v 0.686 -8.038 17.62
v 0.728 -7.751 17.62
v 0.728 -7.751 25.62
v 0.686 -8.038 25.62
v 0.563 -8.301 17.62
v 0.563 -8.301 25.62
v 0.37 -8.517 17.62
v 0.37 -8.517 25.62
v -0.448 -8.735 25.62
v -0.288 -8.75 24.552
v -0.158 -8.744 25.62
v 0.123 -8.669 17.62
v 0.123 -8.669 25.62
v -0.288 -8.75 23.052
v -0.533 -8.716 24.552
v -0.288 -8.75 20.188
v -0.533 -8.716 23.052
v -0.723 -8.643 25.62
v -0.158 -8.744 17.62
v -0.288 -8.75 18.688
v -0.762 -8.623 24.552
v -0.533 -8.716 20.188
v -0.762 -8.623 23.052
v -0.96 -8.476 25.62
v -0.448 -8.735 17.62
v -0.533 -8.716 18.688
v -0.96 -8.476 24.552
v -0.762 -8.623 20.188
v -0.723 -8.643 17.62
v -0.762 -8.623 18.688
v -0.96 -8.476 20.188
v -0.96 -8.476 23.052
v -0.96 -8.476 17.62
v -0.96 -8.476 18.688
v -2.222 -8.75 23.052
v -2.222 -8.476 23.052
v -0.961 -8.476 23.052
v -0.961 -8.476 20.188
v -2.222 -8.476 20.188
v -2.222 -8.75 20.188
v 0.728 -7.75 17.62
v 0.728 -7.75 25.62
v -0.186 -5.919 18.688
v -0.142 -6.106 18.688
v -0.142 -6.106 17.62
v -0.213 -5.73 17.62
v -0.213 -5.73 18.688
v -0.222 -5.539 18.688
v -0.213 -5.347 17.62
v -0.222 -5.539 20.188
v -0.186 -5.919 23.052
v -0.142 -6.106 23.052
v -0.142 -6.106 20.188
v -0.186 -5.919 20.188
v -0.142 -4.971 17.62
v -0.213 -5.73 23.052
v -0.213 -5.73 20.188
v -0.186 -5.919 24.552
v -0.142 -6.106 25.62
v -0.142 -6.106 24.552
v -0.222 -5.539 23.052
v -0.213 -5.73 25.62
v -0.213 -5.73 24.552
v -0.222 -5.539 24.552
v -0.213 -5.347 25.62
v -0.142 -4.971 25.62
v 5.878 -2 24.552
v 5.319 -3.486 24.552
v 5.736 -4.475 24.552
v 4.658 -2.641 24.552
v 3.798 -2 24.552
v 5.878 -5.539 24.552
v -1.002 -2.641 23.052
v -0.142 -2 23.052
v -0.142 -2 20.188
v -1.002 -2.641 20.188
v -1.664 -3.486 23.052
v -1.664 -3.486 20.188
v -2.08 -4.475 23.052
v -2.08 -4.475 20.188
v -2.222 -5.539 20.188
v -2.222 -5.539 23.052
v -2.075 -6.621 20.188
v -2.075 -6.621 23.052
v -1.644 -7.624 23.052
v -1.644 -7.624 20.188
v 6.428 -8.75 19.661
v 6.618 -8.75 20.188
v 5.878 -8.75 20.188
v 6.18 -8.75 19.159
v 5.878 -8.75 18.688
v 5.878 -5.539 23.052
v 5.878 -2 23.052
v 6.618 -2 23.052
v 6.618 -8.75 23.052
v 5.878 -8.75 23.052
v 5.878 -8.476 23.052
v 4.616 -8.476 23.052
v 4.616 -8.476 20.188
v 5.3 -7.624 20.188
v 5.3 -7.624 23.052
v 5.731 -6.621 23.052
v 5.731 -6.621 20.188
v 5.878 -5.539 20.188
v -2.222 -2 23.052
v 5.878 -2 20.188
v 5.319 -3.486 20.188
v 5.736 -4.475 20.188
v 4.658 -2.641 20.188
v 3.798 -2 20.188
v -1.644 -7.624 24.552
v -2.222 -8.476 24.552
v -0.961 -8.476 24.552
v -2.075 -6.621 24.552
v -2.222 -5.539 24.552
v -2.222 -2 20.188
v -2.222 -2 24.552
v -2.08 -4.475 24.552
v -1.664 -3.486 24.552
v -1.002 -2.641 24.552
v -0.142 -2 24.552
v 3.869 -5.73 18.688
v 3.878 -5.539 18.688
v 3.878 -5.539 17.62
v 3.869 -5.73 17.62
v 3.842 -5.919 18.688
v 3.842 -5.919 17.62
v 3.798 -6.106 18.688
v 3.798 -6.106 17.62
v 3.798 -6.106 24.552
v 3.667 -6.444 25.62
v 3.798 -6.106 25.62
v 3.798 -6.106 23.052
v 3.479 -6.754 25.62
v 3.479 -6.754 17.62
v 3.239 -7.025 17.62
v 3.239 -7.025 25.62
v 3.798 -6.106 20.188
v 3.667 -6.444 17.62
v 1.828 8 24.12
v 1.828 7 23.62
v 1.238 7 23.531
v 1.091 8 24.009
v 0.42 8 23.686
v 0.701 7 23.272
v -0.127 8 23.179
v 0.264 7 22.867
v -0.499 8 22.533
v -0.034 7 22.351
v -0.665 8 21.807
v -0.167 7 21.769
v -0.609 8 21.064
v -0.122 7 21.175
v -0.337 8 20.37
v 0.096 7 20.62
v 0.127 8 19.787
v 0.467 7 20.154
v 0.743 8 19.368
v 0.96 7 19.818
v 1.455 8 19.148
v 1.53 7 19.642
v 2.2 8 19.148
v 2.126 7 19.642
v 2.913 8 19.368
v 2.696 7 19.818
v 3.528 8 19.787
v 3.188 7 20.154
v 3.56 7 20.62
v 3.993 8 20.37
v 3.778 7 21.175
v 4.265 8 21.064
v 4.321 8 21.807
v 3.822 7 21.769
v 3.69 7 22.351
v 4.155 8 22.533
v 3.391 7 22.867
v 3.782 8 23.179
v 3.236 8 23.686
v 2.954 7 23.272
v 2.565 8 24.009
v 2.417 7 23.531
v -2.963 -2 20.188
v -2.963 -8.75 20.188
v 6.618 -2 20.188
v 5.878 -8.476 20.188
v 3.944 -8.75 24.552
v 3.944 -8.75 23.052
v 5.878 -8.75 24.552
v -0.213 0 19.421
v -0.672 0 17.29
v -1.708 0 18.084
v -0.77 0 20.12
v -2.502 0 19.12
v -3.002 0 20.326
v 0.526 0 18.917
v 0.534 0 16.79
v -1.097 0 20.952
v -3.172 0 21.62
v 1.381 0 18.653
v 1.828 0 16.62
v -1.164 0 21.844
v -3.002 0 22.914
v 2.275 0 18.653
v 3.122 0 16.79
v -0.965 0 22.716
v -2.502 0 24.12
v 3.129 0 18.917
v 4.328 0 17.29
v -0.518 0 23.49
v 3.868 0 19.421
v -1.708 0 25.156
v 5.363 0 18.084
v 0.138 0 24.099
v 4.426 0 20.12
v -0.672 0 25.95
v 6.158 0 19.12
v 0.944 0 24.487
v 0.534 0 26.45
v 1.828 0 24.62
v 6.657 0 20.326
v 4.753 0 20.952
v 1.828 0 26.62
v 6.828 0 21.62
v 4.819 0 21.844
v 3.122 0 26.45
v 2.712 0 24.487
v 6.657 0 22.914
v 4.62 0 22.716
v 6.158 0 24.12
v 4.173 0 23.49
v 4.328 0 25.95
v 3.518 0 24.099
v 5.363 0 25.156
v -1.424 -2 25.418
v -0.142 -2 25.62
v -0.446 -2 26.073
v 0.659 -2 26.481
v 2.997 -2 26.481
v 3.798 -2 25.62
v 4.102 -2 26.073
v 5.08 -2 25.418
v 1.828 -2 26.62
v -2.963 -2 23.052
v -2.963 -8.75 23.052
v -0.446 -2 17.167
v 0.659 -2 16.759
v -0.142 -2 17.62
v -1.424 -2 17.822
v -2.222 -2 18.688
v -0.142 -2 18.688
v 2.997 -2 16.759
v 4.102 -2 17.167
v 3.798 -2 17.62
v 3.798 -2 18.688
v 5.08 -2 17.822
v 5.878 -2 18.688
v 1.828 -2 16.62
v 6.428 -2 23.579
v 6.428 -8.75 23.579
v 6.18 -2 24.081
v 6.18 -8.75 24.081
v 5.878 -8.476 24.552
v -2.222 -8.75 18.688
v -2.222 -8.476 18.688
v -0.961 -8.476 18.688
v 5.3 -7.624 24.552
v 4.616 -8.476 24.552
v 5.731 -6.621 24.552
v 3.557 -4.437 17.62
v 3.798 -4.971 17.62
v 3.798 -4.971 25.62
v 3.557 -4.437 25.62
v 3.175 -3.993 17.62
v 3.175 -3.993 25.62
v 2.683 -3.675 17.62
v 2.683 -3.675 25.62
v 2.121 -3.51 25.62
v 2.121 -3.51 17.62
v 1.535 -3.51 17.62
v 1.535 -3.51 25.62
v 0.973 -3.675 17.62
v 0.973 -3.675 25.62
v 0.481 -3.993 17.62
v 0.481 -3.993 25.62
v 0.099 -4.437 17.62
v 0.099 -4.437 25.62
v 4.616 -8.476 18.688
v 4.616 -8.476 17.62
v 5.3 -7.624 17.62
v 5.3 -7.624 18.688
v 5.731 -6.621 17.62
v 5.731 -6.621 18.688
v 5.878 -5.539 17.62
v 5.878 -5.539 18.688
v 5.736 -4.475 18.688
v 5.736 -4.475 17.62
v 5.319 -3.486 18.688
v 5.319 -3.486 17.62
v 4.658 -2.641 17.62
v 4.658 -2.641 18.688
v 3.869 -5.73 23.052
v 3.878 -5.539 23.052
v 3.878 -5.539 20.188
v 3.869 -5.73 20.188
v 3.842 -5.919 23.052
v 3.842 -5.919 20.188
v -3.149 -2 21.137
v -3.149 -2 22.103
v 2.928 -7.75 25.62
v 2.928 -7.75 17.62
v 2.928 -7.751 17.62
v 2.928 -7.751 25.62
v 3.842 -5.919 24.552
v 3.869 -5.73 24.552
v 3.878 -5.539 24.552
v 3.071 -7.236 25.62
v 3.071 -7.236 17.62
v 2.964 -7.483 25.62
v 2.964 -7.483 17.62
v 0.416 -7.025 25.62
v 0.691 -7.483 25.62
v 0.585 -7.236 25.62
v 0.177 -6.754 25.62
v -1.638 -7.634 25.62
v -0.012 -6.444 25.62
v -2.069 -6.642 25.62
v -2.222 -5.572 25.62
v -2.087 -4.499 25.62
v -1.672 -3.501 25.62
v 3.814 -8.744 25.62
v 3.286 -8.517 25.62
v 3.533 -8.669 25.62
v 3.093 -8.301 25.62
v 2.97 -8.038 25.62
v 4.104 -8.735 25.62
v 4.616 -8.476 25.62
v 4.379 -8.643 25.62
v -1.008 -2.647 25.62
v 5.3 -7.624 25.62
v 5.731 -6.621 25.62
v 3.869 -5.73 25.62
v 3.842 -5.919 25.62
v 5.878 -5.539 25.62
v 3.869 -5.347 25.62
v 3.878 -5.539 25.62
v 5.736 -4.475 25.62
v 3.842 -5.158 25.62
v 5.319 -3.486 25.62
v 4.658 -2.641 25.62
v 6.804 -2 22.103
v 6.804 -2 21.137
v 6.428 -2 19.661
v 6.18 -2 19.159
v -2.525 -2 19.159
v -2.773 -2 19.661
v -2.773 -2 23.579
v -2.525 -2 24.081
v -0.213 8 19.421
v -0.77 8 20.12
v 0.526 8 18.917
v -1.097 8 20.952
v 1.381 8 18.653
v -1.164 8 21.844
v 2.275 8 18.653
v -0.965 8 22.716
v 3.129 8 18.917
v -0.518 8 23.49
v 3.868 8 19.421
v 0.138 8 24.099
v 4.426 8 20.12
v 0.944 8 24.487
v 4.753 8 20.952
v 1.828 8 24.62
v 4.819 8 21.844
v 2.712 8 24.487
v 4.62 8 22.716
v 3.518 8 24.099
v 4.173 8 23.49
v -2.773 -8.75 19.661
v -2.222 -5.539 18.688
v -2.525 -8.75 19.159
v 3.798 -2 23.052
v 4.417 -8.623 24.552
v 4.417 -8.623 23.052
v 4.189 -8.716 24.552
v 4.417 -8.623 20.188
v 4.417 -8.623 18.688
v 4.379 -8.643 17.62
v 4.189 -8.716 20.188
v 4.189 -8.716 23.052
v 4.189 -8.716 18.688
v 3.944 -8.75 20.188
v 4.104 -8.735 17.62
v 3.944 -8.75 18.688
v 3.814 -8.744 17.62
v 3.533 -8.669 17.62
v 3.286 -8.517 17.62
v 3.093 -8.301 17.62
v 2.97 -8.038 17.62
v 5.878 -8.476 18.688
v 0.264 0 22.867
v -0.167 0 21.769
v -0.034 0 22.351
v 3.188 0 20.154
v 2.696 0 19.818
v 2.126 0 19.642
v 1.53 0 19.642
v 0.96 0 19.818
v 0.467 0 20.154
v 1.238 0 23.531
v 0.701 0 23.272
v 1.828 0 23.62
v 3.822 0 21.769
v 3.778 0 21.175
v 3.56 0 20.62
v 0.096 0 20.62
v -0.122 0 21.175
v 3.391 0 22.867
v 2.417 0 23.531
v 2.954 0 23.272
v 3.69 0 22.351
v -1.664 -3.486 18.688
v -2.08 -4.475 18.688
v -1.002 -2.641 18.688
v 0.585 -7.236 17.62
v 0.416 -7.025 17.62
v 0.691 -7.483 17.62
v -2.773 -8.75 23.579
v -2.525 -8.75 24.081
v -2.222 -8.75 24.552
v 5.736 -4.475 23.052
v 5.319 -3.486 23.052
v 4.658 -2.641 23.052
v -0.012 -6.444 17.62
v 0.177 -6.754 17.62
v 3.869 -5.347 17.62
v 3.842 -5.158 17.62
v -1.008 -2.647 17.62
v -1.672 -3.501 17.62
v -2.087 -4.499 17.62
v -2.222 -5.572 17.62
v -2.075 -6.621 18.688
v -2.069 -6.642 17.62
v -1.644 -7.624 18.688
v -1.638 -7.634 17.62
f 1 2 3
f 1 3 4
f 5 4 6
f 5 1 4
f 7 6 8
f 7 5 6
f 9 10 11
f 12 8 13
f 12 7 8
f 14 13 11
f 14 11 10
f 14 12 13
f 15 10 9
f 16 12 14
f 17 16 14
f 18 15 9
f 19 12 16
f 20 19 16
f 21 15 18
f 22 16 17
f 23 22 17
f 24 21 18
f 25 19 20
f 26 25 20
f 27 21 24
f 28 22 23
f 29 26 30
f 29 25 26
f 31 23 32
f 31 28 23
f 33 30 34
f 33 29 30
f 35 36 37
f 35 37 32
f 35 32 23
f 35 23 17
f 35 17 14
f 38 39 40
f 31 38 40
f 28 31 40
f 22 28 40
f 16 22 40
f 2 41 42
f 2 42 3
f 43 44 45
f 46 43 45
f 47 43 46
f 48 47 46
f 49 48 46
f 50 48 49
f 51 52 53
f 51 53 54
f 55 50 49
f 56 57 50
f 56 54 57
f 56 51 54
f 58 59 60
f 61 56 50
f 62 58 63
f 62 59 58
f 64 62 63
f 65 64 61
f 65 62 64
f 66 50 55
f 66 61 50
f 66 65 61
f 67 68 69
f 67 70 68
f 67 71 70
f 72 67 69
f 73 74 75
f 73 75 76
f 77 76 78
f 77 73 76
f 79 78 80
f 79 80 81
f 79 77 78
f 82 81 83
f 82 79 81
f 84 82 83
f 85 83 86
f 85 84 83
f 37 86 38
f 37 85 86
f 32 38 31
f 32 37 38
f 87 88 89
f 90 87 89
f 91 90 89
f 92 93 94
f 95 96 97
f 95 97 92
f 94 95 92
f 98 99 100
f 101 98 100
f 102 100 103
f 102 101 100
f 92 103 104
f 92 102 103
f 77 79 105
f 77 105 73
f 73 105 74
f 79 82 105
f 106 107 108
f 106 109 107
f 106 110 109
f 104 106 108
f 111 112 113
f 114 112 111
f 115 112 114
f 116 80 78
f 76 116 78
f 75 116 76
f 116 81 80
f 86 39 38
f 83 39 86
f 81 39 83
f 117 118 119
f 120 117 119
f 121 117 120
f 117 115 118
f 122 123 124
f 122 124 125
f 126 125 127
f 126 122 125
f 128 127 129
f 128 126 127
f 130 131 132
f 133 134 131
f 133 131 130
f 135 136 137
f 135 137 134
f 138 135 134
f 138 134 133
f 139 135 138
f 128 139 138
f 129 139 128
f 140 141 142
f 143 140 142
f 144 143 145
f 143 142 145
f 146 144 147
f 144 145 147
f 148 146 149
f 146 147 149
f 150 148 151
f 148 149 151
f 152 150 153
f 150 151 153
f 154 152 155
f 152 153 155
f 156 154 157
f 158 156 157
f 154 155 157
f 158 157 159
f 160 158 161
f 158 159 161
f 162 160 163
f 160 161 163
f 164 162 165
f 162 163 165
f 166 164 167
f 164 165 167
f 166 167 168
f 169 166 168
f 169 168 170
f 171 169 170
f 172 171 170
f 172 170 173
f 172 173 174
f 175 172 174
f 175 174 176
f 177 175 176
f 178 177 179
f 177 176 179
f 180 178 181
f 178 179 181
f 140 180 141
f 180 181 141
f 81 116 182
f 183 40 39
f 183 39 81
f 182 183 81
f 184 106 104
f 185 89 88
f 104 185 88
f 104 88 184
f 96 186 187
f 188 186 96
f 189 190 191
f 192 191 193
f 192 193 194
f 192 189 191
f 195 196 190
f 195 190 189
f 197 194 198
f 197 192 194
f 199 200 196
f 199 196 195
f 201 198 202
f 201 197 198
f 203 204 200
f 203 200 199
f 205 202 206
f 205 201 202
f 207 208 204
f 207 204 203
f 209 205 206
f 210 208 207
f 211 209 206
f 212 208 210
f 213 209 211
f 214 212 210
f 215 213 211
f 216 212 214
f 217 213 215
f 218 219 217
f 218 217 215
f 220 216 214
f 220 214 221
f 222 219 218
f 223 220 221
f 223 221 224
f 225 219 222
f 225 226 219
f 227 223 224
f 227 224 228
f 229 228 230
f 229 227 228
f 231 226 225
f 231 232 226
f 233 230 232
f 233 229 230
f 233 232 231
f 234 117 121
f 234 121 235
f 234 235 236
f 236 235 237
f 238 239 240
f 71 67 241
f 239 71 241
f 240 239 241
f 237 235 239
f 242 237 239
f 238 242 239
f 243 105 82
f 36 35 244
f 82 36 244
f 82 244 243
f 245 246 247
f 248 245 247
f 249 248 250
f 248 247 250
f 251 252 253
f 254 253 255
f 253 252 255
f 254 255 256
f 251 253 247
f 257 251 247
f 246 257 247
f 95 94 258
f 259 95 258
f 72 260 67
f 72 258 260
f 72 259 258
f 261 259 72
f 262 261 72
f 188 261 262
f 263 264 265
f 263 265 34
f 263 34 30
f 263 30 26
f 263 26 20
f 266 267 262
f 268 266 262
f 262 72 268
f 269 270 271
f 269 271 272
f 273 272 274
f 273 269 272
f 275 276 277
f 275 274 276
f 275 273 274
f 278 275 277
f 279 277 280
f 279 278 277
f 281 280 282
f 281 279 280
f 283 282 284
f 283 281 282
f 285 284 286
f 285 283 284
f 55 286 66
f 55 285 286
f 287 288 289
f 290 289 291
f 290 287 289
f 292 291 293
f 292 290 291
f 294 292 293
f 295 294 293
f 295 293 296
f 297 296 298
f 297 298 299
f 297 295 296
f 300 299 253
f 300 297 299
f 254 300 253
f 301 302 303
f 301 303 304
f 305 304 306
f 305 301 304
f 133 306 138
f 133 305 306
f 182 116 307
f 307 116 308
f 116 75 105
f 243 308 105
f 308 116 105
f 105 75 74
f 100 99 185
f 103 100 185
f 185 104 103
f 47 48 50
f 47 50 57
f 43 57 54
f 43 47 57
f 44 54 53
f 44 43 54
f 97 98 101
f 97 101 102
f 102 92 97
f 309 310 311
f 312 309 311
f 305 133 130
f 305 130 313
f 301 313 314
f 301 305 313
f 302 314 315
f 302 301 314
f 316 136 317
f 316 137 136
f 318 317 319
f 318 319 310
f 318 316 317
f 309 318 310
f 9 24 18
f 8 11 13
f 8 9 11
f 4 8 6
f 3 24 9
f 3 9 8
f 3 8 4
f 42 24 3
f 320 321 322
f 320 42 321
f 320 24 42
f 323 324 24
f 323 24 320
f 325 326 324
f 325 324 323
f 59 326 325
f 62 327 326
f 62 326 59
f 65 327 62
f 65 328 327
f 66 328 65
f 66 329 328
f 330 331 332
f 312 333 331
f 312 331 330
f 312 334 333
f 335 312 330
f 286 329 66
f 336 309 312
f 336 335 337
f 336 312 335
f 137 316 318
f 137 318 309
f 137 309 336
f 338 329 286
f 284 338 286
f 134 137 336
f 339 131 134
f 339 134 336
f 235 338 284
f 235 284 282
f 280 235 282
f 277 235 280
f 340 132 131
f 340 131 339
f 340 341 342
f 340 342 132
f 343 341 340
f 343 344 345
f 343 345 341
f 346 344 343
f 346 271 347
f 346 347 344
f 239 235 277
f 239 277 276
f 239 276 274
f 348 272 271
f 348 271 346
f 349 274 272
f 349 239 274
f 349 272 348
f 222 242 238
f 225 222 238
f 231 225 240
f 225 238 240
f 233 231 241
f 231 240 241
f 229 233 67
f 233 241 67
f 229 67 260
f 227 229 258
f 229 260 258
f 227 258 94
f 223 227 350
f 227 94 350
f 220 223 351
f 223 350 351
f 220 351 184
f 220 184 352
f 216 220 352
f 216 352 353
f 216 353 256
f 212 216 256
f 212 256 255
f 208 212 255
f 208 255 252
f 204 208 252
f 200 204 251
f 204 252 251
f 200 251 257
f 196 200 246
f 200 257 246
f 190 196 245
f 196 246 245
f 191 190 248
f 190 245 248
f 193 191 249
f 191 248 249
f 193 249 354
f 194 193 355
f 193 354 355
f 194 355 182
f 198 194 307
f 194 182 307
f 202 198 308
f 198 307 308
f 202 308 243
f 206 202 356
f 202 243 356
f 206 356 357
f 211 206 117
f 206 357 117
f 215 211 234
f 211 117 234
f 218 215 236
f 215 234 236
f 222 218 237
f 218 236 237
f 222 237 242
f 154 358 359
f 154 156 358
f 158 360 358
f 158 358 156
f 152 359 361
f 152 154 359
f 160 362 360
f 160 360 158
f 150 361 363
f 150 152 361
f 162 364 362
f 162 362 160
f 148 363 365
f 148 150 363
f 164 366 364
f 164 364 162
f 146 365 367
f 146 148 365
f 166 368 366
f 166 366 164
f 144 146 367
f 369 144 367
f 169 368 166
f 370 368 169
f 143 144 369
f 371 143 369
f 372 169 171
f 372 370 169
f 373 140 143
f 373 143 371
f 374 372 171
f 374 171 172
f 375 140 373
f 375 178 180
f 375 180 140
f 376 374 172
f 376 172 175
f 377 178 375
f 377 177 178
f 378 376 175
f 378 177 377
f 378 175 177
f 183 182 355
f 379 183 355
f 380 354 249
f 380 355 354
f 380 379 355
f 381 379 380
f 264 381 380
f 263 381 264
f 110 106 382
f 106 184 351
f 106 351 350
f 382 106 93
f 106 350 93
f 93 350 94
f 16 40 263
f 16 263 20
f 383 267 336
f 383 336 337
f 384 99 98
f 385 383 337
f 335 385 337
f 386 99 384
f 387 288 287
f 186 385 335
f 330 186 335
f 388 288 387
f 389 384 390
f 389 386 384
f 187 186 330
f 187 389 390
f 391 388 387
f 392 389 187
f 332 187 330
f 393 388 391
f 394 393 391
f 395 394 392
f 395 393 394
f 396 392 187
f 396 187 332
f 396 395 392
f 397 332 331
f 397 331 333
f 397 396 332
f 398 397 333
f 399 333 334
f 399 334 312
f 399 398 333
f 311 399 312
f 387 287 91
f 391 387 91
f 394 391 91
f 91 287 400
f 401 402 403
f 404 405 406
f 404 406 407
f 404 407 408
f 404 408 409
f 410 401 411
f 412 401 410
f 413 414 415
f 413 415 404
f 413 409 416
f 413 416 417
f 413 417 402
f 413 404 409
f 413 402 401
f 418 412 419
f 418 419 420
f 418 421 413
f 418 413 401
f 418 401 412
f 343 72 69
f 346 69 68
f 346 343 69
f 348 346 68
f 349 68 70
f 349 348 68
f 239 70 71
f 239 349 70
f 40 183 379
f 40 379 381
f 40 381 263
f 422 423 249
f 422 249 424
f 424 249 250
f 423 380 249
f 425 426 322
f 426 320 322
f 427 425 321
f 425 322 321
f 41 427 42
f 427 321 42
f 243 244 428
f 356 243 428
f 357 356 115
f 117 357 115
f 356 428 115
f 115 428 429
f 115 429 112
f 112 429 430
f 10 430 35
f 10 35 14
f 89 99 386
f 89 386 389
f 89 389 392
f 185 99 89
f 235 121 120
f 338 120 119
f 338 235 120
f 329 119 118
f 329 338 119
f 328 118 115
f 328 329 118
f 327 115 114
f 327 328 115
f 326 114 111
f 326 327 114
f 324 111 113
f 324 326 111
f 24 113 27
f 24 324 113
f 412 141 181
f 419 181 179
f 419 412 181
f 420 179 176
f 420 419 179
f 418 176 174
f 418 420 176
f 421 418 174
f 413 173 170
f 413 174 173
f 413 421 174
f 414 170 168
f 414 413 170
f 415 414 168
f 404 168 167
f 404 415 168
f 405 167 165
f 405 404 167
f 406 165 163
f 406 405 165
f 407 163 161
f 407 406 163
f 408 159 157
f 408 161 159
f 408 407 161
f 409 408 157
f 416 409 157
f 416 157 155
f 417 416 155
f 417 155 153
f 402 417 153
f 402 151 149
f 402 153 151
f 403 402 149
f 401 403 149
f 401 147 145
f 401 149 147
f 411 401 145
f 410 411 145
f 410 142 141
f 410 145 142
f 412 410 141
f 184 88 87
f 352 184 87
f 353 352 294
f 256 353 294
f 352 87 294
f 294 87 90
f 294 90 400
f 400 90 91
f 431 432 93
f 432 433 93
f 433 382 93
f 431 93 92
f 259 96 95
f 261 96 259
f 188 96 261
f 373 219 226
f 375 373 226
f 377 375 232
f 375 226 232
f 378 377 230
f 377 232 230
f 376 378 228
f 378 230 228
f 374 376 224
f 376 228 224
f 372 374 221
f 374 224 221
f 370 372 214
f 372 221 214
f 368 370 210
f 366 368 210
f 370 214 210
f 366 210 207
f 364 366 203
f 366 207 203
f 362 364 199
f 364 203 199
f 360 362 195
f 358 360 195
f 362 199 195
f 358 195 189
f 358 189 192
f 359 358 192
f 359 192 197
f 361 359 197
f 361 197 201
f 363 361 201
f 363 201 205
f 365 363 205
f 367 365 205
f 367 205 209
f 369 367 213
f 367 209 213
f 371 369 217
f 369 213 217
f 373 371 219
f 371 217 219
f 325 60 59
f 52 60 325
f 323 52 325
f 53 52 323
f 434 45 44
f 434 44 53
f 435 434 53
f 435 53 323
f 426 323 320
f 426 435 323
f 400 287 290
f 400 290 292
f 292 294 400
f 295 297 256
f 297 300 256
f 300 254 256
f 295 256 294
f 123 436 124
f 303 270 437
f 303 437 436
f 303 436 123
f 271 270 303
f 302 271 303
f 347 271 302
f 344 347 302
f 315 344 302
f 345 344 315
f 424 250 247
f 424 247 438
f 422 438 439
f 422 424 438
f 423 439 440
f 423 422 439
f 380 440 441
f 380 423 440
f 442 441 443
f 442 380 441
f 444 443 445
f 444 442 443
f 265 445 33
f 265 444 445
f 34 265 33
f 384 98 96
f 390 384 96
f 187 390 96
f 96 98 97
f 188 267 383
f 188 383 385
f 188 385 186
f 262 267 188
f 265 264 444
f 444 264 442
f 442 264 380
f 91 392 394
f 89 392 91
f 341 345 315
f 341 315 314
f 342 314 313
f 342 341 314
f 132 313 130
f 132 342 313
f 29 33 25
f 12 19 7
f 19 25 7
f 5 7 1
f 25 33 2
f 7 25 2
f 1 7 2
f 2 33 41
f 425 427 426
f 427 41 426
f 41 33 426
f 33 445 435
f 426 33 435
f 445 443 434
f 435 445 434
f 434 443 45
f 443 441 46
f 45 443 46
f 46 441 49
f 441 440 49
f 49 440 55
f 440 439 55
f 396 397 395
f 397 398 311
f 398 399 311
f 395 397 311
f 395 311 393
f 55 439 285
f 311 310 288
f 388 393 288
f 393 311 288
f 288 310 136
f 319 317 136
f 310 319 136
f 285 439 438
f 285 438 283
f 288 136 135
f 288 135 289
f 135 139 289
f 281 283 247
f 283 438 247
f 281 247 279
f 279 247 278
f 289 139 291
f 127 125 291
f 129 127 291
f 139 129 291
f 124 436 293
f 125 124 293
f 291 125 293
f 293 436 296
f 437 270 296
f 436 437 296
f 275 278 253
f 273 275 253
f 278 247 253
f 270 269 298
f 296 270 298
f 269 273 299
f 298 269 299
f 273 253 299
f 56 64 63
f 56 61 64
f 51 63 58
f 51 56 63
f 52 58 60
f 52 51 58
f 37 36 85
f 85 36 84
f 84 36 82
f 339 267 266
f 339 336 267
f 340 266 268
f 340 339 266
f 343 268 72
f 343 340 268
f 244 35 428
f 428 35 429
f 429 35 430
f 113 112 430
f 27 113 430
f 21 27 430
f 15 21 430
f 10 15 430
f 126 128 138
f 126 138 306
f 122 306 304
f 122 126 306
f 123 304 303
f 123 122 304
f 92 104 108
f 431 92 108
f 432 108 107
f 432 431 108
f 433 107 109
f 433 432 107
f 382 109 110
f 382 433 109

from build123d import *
from build123d.topology import SkipClean

# Parameters (mm, degrees)
BOSS_EXTRUDE9_DEPTH       = 5.6
BOSS_EXTRUDE9_DEPTH_BACK  = 2
SKETCH16_W                = 8
SKETCH16_H                = 3.5
BOSS_EXTRUDE11_DEPTH      = 8
CHAMFER2_SIZE             = 1.5
SKETCH17_W                = 3.94
SKETCH17_H                = 8
BOSS_EXTRUDE12_DEPTH      = 6.3
CUT_EXTRUDE2_START        = -5.6
CUT_EXTRUDE2_DEPTH        = 3.6
SKETCH21_R                = 1.5
BOSS_EXTRUDE14_DEPTH      = 3.6
CHAMFER4_SIZE             = 1
CUT_EXTRUDE3_DEPTH        = 3.6
SPLIT1_START              = -2
SPLIT1_DEPTH              = 7.6
SKETCH22_R                = 5
BOSS_EXTRUDE15_DEPTH      = 2
SKETCH23_R                = 3
BOSS_EXTRUDE16_DEPTH      = 8
CUT_EXTRUDE4_DEPTH        = 32.952026383
CUT_EXTRUDE4_DEPTH_BACK   = 8
SKETCH24_R                = 2
CHAMFER5_SIZE             = 0.5
CHAMFER5_SIZE2            = 1
BOSS_EXTRUDE17_DEPTH      = 8
CUT_EXTRUDE6_DEPTH        = 15.719504629
CUT_EXTRUDE6_DEPTH_BACK   = 15.719504629
FILLET2_R                 = 1
BOSS_EXTRUDE18_REACH      = 31.245
BOSS_EXTRUDE18_END_RADIUS = 4.05
SKETCH27_W                = 2.08
SKETCH27_H                = 1.5
BOSS_EXTRUDE19_START      = 3.538587
SKETCH27_3_W              = 2.08
SKETCH27_3_H              = 1.5
BOSS_EXTRUDE19_DEPTH      = 2.937113
CUT_EXTRUDE7_DEPTH        = 15.289597343
CUT_EXTRUDE7_DEPTH_BACK   = 15.289597343
SKETCH29_W                = 1.95
SKETCH29_H                = 0.274787005
BOSS_EXTRUDE20_DEPTH      = 1.5
BOSS_EXTRUDE21_START      = -4.364299
SKETCH29_3_W              = 1.95
SKETCH29_3_H              = 0.274787005
BOSS_EXTRUDE21_DEPTH      = 1.5
BOSS_EXTRUDE22_DEPTH      = 6.750486925


# Read off the part's stored shape, not the designer's step: Split1
# Some blends are built 0.0001 mm under size
with BuildPart() as part:
    # Sketch14 → Boss-Extrude9 (new, two sides: drawn at the far end of the back side and taken through both)
    with BuildSketch(Plane(origin=(0, 0, 0), x_dir=(1, 0, 0), z_dir=(0, 1, 0)).offset(-BOSS_EXTRUDE9_DEPTH_BACK)):
        with BuildLine():
            Line((-4.172171186, -20.619968889), (-4.172171186, -25.619968889))
            Line((-4.172171186, -25.619968889), (7.827828814, -25.619968889))
            Line((7.827828814, -25.619968889), (7.827828814, -20.619968889))
            ThreePointArc((7.827828814, -20.619968889), (1.827828814, -14.619968889), (-4.172171186, -20.619968889))
        make_face()
    extrude(amount=BOSS_EXTRUDE9_DEPTH + BOSS_EXTRUDE9_DEPTH_BACK)

    # Sketch16 → Boss-Extrude11 (add)
    with BuildSketch(Plane.XY.offset(25.619968889)):
        with Locations((1.827828814, 1.75)):
            Rectangle(SKETCH16_W, SKETCH16_H)
    extrude(amount=BOSS_EXTRUDE11_DEPTH)

    # Chamfer2
    chamfer2_edges = [part.edges().sort_by_distance(p)[0] for p in [
        (1.827828814, -2, 14.619968889),
        (7.827828814, 5.6, 23.119968889),
        (1.827828814, 5.6, 14.619968889),
        (-4.172171186, -2, 23.119968889),
        (-4.172171186, 5.6, 23.119968889),
        (7.827828814, -2, 23.119968889),
    ]]
    chamfer(chamfer2_edges, length=CHAMFER2_SIZE)

    # Sketch17 → Boss-Extrude12 (add)
    with BuildSketch(Plane.XZ.offset(2)):
        with Locations((1.827828814, 21.619968889)):
            Rectangle(SKETCH17_W, SKETCH17_H)
    extrude(amount=BOSS_EXTRUDE12_DEPTH)

    # Sketch20 → Cut-Extrude2 (cut)
    with BuildSketch(Plane(origin=(0, 5.6, 0), x_dir=(1, 0, 0), z_dir=(0, 1, 0)).offset(CUT_EXTRUDE2_START)):
        with BuildLine():
            Line((7.827828814, -20.619968889), (-4.172171186, -20.619968889))
            ThreePointArc((-4.172171186, -20.619968889), (1.827828814, -14.619968889), (7.827828814, -20.619968889))
        make_face()
    extrude(amount=CUT_EXTRUDE2_DEPTH, mode=Mode.SUBTRACT)

    # Sketch21 → Boss-Extrude14 (add)
    with BuildSketch(Plane(origin=(0, 0, 0), x_dir=(1, 0, 0), z_dir=(0, 1, 0))):
        with BuildLine():
            ThreePointArc((7.827828814, -20.619968889), (7.63955943, -19.128732072), (7.086566399, -17.731080001))
            ThreePointArc((7.086566399, -17.731080001), (6.279209969, -19.350325806), (4.990106474, -20.619968889))
            Line((4.990106474, -20.619968889), (7.827828814, -20.619968889))
        make_face()
        with BuildLine():
            ThreePointArc((-1.334448847, -20.619968889), (-2.623552342, -19.350325806), (-3.430908771, -17.731080001))
            ThreePointArc((-3.430908771, -17.731080001), (-3.983901803, -19.128732072), (-4.172171186, -20.619968889))
            Line((-4.172171186, -20.619968889), (-1.334448847, -20.619968889))
        make_face()
        with Locations(Location((1.827828814, -16.119968889, 0), (0, 0, 90.000763944))):
            Circle(SKETCH21_R)
    extrude(amount=BOSS_EXTRUDE14_DEPTH)

    # Chamfer4
    # the kernel refuses this chamfer: 1 mm, written as the material it adds along each edge
    with BuildSketch(Plane(origin=(1.827828814, 3.6, 16.119968889), x_dir=(-1.3333338100422289e-05, 0, -0.999999999911111), z_dir=(0.999999999911111, 0, -1.3333338100422289e-05))) as chamfer4_piece_1_section:
        Polygon((1.5, -CHAMFER4_SIZE), (1.5 + CHAMFER4_SIZE, 0), (1.5, 0), align=None)
    chamfer4_piece_1 = revolve(axis=Axis((1.827828814, 3.6, 16.119968889), (0, 1, 0)), mode=Mode.PRIVATE)
    chamfer4_piece_1 = chamfer4_piece_1 & Plane(origin=(1.827828814, 3.111670507, 20.619968889), x_dir=(1, 0, 0), z_dir=(0, -1, 0)) * Cylinder(6, 10, mode=Mode.PRIVATE)
    add(chamfer4_piece_1)
    with BuildSketch(Plane(origin=(1.827828814, 0, 16.119968889), x_dir=(-1.3333338100422289e-05, 0, -0.999999999911111), z_dir=(0.999999999911111, 0, -1.3333338100422289e-05))) as chamfer4_piece_2_section:
        Polygon((1.5 + CHAMFER4_SIZE, 0), (1.5, CHAMFER4_SIZE), (1.5, 0), align=None)
    chamfer4_piece_2 = revolve(axis=Axis((1.827828814, 0, 16.119968889), (0, 1, 0)), mode=Mode.PRIVATE)
    chamfer4_piece_2 = chamfer4_piece_2 & Plane(origin=(1.827828814, 0.488329493, 20.619968889), x_dir=(1, 0, 0), z_dir=(0, -1, 0)) * Cylinder(6, 10, mode=Mode.PRIVATE)
    add(chamfer4_piece_2)

    # Sketch21<3> → Cut-Extrude3 (cut)
    with BuildSketch(Plane(origin=(0, 0, 0), x_dir=(1, 0, 0), z_dir=(0, 1, 0))):
        with BuildLine():
            Line((4.990106474, -20.619968889), (-1.334448847, -20.619968889))
            ThreePointArc((-1.334448847, -20.619968889), (1.827828814, -21.619968889), (4.990106474, -20.619968889))
        make_face()
    extrude(amount=CUT_EXTRUDE3_DEPTH, mode=Mode.SUBTRACT)

    # Split1 outline → Split1 (cut)
    with BuildSketch(Plane(origin=(0, 0, 0), x_dir=(1, 0, 0), z_dir=(0, 1, 0)).offset(SPLIT1_START)):
        with BuildLine():
            Line((7.827828814, -25.619968889), (7.827828814, -20.619968889))
            ThreePointArc((7.827828814, -20.619968889), (1.827828814, -14.619968889), (-4.172171186, -20.619968889))
            Line((-4.172171186, -20.619968889), (-4.172171186, -25.619968889))
            Line((-4.172171186, -25.619968889), (-2.172171186, -25.619968889))
            Line((-2.172171186, -25.619968889), (-2.172171186, -33.619968889))
            Line((-2.172171186, -33.619968889), (5.827828814, -33.619968889))
            Line((5.827828814, -33.619968889), (5.827828814, -25.619968889))
            Line((5.827828814, -25.619968889), (7.827828814, -25.619968889))
        make_face()
    extrude(amount=SPLIT1_DEPTH, mode=Mode.SUBTRACT)

    # Sketch22 → Boss-Extrude15 (add)
    with BuildSketch(Plane(origin=(0, -2, 0), x_dir=(1, 0, 0), z_dir=(0, 1, 0))):
        with Locations(Location((1.827828814, -21.619968889, 0), (0, 0, 270))):
            Circle(SKETCH22_R)
    extrude(amount=BOSS_EXTRUDE15_DEPTH)

    # Sketch23 → Boss-Extrude16 (add)
    with BuildSketch(Plane(origin=(0, 0, 0), x_dir=(1, 0, 0), z_dir=(0, 1, 0))):
        with Locations(Location((1.827828814, -21.619968889, 0), (0, 0, 270))):
            Circle(SKETCH23_R)
    extrude(amount=BOSS_EXTRUDE16_DEPTH)

    # Sketch24 → Cut-Extrude4 (cut, two sides: drawn at the far end of the back side and taken through both)
    with BuildSketch(Plane(origin=(0, 8, 0), x_dir=(1, 0, 0), z_dir=(0, 1, 0)).offset(-CUT_EXTRUDE4_DEPTH_BACK)):
        with Locations(Location((1.827828814, -21.619968889, 0), (0, 0, 270))):
            Circle(SKETCH24_R)
    extrude(amount=CUT_EXTRUDE4_DEPTH + CUT_EXTRUDE4_DEPTH_BACK, mode=Mode.SUBTRACT)

    # Chamfer5
    chamfer5_edges = [part.edges().sort_by_distance(p)[0] for p in [
        (1.827828814, 8, 19.619968889),
    ]]
    chamfer5_side = [part.faces().sort_by_distance(p)[0] for p in [
        (1.827828814, 8, 18.704821703),
    ]]
    chamfer(chamfer5_edges, length=CHAMFER5_SIZE, length2=CHAMFER5_SIZE2, reference=chamfer5_side[0])

    # Sketch25 → Boss-Extrude17 (add)
    with BuildSketch(Plane.XY.offset(25.619968889)):
        with BuildLine():
            Line((3.797828814, -8.3), (2.927828814, -8.3))
            Line((2.927828814, -8.3), (2.927828814, -9.436343053))
            ThreePointArc((2.927828814, -9.436343053), (5.057186335, -7.982712899), (5.877828814, -5.538587289))
            ThreePointArc((5.877828814, -5.538587289), (5.319318467, -3.486271524), (3.797828814, -2))
            Line((3.797828814, -2), (3.797828814, -4.971489414))
            ThreePointArc((3.797828814, -4.971489414), (3.857730289, -5.252230867), (3.877828814, -5.538587289))
            ThreePointArc((3.877828814, -5.538587289), (3.857730289, -5.82494371), (3.797828814, -6.105685164))
            Line((3.797828814, -6.105685164), (3.797828814, -8.3))
        make_face()
        with BuildLine():
            Line((0.727828814, -9.436343053), (0.727828814, -8.3))
            Line((0.727828814, -8.3), (-0.142171186, -8.3))
            Line((-0.142171186, -8.3), (-0.142171186, -6.105685164))
            ThreePointArc((-0.142171186, -6.105685164), (-0.222171186, -5.538587289), (-0.142171186, -4.971489414))
            Line((-0.142171186, -4.971489414), (-0.142171186, -2))
            ThreePointArc((-0.142171186, -2), (-2.194735605, -6.009199123), (0.727828814, -9.436343053))
        make_face()
        with BuildLine():
            Line((-0.142171186, -2), (-0.142171186, -4.971489414))
            ThreePointArc((-0.142171186, -4.971489414), (1.827828814, -3.488587289), (3.797828814, -4.971489414))
            Line((3.797828814, -4.971489414), (3.797828814, -2))
            Line((3.797828814, -2), (-0.142171186, -2))
        make_face()
        with BuildLine():
            ThreePointArc((3.797828814, -6.105685164), (3.469243788, -6.766698391), (2.927828814, -7.268471678))
            Line((2.927828814, -7.268471678), (2.927828814, -8.3))
            Line((2.927828814, -8.3), (3.797828814, -8.3))
            Line((3.797828814, -8.3), (3.797828814, -6.105685164))
        make_face()
        with BuildLine():
            Line((0.727828814, -8.3), (0.727828814, -7.268471678))
            ThreePointArc((0.727828814, -7.268471678), (0.186413839, -6.766698391), (-0.142171186, -6.105685164))
            Line((-0.142171186, -6.105685164), (-0.142171186, -8.3))
            Line((-0.142171186, -8.3), (0.727828814, -8.3))
        make_face()
    extrude(amount=-BOSS_EXTRUDE17_DEPTH)

    # Sketch25<3> → Cut-Extrude6 (cut, two sides: drawn at the far end of the back side and taken through both)
    with BuildSketch(Plane.XY.offset(25.619968889).offset(-CUT_EXTRUDE6_DEPTH_BACK)):
        with BuildLine():
            ThreePointArc((-0.142171186, -6.105685164), (0.186413839, -6.766698391), (0.727828814, -7.268471678))
            Line((0.727828814, -7.268471678), (0.727828814, -8.3))
            Line((0.727828814, -8.3), (2.927828814, -8.3))
            Line((2.927828814, -8.3), (2.927828814, -7.268471678))
            ThreePointArc((2.927828814, -7.268471678), (3.469243788, -6.766698391), (3.797828814, -6.105685164))
            Line((3.797828814, -6.105685164), (3.797828814, -4.971489414))
            ThreePointArc((3.797828814, -4.971489414), (1.827828814, -3.488587289), (-0.142171186, -4.971489414))
            Line((-0.142171186, -4.971489414), (-0.142171186, -6.105685164))
        make_face()
    extrude(amount=CUT_EXTRUDE6_DEPTH + CUT_EXTRUDE6_DEPTH_BACK, mode=Mode.SUBTRACT)

    # Fillet2
    fillet2_edges = [part.edges().sort_by_distance(p)[0] for p in [
        (0.727828814, -7.268471678, 21.619968889),
        (2.927828814, -7.268471678, 21.619968889),
        (2.927828814, -9.436343053, 21.619968889),
        (0.727828814, -9.436343053, 21.619968889),
    ]]
    fillet(fillet2_edges, radius=FILLET2_R - 0.0001)  # a hair under: the kernel refuses the full size

    # Boss-Extrude18: up to this cylinder (the profile starts outside it)
    boss_extrude18_end = Plane(origin=(1.827828814, -5.538587289, 21.619969), z_dir=(0, 0, 1)) * Cylinder(BOSS_EXTRUDE18_END_RADIUS, 75.954298, mode=Mode.PRIVATE)
    # Sketch27 → Boss-Extrude18 (add, up to the surface)
    with BuildSketch(Plane.XZ.offset(2), mode=Mode.PRIVATE) as boss_extrude18_sk1:
        with Locations((-1.182171186, 23.802118272)):
            Rectangle(SKETCH27_W, SKETCH27_H)
    boss_extrude18_tool1 = extrude(boss_extrude18_sk1.sketch, amount=BOSS_EXTRUDE18_REACH, mode=Mode.PRIVATE) - boss_extrude18_end
    add(boss_extrude18_tool1.solids().sort_by_distance((-1.182171, -2, 23.802118))[0])
    # Sketch27 → Boss-Extrude18 (add, up to the surface)
    with BuildSketch(Plane.XZ.offset(2), mode=Mode.PRIVATE) as boss_extrude18_sk2:
        with Locations((4.837828814, 23.802118272)):
            Rectangle(SKETCH27_W, SKETCH27_H)
    boss_extrude18_tool2 = extrude(boss_extrude18_sk2.sketch, amount=BOSS_EXTRUDE18_REACH, mode=Mode.PRIVATE) - boss_extrude18_end
    add(boss_extrude18_tool2.solids().sort_by_distance((4.837829, -2, 23.802118))[0])
    # Sketch27 → Boss-Extrude18 (add, up to the surface)
    with BuildSketch(Plane.XZ.offset(2), mode=Mode.PRIVATE) as boss_extrude18_sk3:
        with Locations((4.837828814, 19.437819507)):
            Rectangle(SKETCH27_W, SKETCH27_H)
    boss_extrude18_tool3 = extrude(boss_extrude18_sk3.sketch, amount=BOSS_EXTRUDE18_REACH, mode=Mode.PRIVATE) - boss_extrude18_end
    add(boss_extrude18_tool3.solids().sort_by_distance((4.837829, -2, 19.43782))[0])
    # Sketch27 → Boss-Extrude18 (add, up to the surface)
    with BuildSketch(Plane.XZ.offset(2), mode=Mode.PRIVATE) as boss_extrude18_sk4:
        with Locations((-1.182171186, 19.437819507)):
            Rectangle(SKETCH27_W, SKETCH27_H)
    boss_extrude18_tool4 = extrude(boss_extrude18_sk4.sketch, amount=BOSS_EXTRUDE18_REACH, mode=Mode.PRIVATE) - boss_extrude18_end
    add(boss_extrude18_tool4.solids().sort_by_distance((-1.182171, -2, 19.43782))[0])

    # Sketch27<3> → Boss-Extrude19 (add)
    with BuildSketch(Plane.XZ.offset(2).offset(BOSS_EXTRUDE19_START)):
        with Locations((-1.182171186, 19.437819507)):
            Rectangle(SKETCH27_3_W, SKETCH27_3_H)
        with Locations((4.837828814, 19.437819507)):
            Rectangle(SKETCH27_3_W, SKETCH27_3_H)
        with Locations((4.837828814, 23.802118272)):
            Rectangle(SKETCH27_3_W, SKETCH27_3_H)
        with Locations((-1.182171186, 23.802118272)):
            Rectangle(SKETCH27_3_W, SKETCH27_3_H)
    extrude(amount=BOSS_EXTRUDE19_DEPTH)

    # Sketch25<5> → Cut-Extrude7 (cut, two sides: drawn at the far end of the back side and taken through both)
    with SkipClean():  # the faces are left unmerged after this step: merging them gives an invalid solid
        with BuildSketch(Plane.XY.offset(25.619968889).offset(-CUT_EXTRUDE7_DEPTH_BACK)):
            with BuildLine():
                ThreePointArc((-0.142171186, -6.105685164), (0.186413839, -6.766698391), (0.727828814, -7.268471678))
                Line((0.727828814, -7.268471678), (2.927828814, -7.268471678))
                ThreePointArc((2.927828814, -7.268471678), (3.469243788, -6.766698391), (3.797828814, -6.105685164))
                Line((3.797828814, -6.105685164), (3.797828814, -4.971489414))
                ThreePointArc((3.797828814, -4.971489414), (1.827828814, -3.488587289), (-0.142171186, -4.971489414))
                Line((-0.142171186, -4.971489414), (-0.142171186, -6.105685164))
            make_face()
            with BuildLine():
                Line((3.797828814, -4.971489414), (3.797828814, -6.105685164))
                ThreePointArc((3.797828814, -6.105685164), (3.857730289, -5.82494371), (3.877828814, -5.538587289))
                ThreePointArc((3.877828814, -5.538587289), (3.857730289, -5.252230867), (3.797828814, -4.971489414))
            make_face()
            with BuildLine():
                ThreePointArc((-0.142171186, -4.971489414), (-0.222171186, -5.538587289), (-0.142171186, -6.105685164))
                Line((-0.142171186, -6.105685164), (-0.142171186, -4.971489414))
            make_face()
        extrude(amount=CUT_EXTRUDE7_DEPTH + CUT_EXTRUDE7_DEPTH_BACK, mode=Mode.SUBTRACT)

    # Sketch29 → Boss-Extrude20 (add)
    with SkipClean():  # the faces are left unmerged after this step: merging them gives an invalid solid
        with BuildSketch(Plane.XY.offset(24.552118272)):
            with Locations((-1.247171186, -8.613093423)):
                Rectangle(SKETCH29_W, SKETCH29_H)
            with Locations((4.902828814, -8.613093423)):
                Rectangle(SKETCH29_W, SKETCH29_H)
        extrude(amount=-BOSS_EXTRUDE20_DEPTH)

    # Sketch29<3> → Boss-Extrude21 (add)
    with SkipClean():  # the faces are left unmerged after this step: merging them gives an invalid solid
        with BuildSketch(Plane.XY.offset(24.552118272).offset(BOSS_EXTRUDE21_START)):
            with Locations((-1.247171186, -8.613093423)):
                Rectangle(SKETCH29_3_W, SKETCH29_3_H)
            with Locations((4.902828814, -8.613093423)):
                Rectangle(SKETCH29_3_W, SKETCH29_3_H)
        extrude(amount=-BOSS_EXTRUDE21_DEPTH)

    # Sketch30 → Boss-Extrude22 (add)
    with SkipClean():  # the faces are left unmerged after this step: merging them gives an invalid solid
        with BuildSketch(Plane.XZ.offset(8.750486925)):
            with BuildLine():
                Line((5.877828814, 23.052118272), (6.618334857, 23.052118272))
                ThreePointArc((6.618334857, 23.052118272), (6.311257945, 23.833306466), (5.877828814, 24.552118272))
                Line((5.877828814, 24.552118272), (5.877828814, 23.052118272))
            make_face()
            with BuildLine():
                Line((5.877828814, 20.187819507), (6.618334857, 20.187819507))
                ThreePointArc((6.618334857, 20.187819507), (6.311257945, 19.406631313), (5.877828814, 18.687819507))
                Line((5.877828814, 18.687819507), (5.877828814, 20.187819507))
            make_face()
            with BuildLine():
                Line((-2.222171186, 20.187819507), (-2.962677229, 20.187819507))
                ThreePointArc((-2.962677229, 20.187819507), (-2.655600317, 19.406631313), (-2.222171186, 18.687819507))
                Line((-2.222171186, 18.687819507), (-2.222171186, 20.187819507))
            make_face()
            with BuildLine():
                Line((-2.222171186, 23.052118272), (-2.962677229, 23.052118272))
                ThreePointArc((-2.962677229, 23.052118272), (-2.655600317, 23.833306466), (-2.222171186, 24.552118272))
                Line((-2.222171186, 24.552118272), (-2.222171186, 23.052118272))
            make_face()
        extrude(amount=-BOSS_EXTRUDE22_DEPTH)


solid = part.part
